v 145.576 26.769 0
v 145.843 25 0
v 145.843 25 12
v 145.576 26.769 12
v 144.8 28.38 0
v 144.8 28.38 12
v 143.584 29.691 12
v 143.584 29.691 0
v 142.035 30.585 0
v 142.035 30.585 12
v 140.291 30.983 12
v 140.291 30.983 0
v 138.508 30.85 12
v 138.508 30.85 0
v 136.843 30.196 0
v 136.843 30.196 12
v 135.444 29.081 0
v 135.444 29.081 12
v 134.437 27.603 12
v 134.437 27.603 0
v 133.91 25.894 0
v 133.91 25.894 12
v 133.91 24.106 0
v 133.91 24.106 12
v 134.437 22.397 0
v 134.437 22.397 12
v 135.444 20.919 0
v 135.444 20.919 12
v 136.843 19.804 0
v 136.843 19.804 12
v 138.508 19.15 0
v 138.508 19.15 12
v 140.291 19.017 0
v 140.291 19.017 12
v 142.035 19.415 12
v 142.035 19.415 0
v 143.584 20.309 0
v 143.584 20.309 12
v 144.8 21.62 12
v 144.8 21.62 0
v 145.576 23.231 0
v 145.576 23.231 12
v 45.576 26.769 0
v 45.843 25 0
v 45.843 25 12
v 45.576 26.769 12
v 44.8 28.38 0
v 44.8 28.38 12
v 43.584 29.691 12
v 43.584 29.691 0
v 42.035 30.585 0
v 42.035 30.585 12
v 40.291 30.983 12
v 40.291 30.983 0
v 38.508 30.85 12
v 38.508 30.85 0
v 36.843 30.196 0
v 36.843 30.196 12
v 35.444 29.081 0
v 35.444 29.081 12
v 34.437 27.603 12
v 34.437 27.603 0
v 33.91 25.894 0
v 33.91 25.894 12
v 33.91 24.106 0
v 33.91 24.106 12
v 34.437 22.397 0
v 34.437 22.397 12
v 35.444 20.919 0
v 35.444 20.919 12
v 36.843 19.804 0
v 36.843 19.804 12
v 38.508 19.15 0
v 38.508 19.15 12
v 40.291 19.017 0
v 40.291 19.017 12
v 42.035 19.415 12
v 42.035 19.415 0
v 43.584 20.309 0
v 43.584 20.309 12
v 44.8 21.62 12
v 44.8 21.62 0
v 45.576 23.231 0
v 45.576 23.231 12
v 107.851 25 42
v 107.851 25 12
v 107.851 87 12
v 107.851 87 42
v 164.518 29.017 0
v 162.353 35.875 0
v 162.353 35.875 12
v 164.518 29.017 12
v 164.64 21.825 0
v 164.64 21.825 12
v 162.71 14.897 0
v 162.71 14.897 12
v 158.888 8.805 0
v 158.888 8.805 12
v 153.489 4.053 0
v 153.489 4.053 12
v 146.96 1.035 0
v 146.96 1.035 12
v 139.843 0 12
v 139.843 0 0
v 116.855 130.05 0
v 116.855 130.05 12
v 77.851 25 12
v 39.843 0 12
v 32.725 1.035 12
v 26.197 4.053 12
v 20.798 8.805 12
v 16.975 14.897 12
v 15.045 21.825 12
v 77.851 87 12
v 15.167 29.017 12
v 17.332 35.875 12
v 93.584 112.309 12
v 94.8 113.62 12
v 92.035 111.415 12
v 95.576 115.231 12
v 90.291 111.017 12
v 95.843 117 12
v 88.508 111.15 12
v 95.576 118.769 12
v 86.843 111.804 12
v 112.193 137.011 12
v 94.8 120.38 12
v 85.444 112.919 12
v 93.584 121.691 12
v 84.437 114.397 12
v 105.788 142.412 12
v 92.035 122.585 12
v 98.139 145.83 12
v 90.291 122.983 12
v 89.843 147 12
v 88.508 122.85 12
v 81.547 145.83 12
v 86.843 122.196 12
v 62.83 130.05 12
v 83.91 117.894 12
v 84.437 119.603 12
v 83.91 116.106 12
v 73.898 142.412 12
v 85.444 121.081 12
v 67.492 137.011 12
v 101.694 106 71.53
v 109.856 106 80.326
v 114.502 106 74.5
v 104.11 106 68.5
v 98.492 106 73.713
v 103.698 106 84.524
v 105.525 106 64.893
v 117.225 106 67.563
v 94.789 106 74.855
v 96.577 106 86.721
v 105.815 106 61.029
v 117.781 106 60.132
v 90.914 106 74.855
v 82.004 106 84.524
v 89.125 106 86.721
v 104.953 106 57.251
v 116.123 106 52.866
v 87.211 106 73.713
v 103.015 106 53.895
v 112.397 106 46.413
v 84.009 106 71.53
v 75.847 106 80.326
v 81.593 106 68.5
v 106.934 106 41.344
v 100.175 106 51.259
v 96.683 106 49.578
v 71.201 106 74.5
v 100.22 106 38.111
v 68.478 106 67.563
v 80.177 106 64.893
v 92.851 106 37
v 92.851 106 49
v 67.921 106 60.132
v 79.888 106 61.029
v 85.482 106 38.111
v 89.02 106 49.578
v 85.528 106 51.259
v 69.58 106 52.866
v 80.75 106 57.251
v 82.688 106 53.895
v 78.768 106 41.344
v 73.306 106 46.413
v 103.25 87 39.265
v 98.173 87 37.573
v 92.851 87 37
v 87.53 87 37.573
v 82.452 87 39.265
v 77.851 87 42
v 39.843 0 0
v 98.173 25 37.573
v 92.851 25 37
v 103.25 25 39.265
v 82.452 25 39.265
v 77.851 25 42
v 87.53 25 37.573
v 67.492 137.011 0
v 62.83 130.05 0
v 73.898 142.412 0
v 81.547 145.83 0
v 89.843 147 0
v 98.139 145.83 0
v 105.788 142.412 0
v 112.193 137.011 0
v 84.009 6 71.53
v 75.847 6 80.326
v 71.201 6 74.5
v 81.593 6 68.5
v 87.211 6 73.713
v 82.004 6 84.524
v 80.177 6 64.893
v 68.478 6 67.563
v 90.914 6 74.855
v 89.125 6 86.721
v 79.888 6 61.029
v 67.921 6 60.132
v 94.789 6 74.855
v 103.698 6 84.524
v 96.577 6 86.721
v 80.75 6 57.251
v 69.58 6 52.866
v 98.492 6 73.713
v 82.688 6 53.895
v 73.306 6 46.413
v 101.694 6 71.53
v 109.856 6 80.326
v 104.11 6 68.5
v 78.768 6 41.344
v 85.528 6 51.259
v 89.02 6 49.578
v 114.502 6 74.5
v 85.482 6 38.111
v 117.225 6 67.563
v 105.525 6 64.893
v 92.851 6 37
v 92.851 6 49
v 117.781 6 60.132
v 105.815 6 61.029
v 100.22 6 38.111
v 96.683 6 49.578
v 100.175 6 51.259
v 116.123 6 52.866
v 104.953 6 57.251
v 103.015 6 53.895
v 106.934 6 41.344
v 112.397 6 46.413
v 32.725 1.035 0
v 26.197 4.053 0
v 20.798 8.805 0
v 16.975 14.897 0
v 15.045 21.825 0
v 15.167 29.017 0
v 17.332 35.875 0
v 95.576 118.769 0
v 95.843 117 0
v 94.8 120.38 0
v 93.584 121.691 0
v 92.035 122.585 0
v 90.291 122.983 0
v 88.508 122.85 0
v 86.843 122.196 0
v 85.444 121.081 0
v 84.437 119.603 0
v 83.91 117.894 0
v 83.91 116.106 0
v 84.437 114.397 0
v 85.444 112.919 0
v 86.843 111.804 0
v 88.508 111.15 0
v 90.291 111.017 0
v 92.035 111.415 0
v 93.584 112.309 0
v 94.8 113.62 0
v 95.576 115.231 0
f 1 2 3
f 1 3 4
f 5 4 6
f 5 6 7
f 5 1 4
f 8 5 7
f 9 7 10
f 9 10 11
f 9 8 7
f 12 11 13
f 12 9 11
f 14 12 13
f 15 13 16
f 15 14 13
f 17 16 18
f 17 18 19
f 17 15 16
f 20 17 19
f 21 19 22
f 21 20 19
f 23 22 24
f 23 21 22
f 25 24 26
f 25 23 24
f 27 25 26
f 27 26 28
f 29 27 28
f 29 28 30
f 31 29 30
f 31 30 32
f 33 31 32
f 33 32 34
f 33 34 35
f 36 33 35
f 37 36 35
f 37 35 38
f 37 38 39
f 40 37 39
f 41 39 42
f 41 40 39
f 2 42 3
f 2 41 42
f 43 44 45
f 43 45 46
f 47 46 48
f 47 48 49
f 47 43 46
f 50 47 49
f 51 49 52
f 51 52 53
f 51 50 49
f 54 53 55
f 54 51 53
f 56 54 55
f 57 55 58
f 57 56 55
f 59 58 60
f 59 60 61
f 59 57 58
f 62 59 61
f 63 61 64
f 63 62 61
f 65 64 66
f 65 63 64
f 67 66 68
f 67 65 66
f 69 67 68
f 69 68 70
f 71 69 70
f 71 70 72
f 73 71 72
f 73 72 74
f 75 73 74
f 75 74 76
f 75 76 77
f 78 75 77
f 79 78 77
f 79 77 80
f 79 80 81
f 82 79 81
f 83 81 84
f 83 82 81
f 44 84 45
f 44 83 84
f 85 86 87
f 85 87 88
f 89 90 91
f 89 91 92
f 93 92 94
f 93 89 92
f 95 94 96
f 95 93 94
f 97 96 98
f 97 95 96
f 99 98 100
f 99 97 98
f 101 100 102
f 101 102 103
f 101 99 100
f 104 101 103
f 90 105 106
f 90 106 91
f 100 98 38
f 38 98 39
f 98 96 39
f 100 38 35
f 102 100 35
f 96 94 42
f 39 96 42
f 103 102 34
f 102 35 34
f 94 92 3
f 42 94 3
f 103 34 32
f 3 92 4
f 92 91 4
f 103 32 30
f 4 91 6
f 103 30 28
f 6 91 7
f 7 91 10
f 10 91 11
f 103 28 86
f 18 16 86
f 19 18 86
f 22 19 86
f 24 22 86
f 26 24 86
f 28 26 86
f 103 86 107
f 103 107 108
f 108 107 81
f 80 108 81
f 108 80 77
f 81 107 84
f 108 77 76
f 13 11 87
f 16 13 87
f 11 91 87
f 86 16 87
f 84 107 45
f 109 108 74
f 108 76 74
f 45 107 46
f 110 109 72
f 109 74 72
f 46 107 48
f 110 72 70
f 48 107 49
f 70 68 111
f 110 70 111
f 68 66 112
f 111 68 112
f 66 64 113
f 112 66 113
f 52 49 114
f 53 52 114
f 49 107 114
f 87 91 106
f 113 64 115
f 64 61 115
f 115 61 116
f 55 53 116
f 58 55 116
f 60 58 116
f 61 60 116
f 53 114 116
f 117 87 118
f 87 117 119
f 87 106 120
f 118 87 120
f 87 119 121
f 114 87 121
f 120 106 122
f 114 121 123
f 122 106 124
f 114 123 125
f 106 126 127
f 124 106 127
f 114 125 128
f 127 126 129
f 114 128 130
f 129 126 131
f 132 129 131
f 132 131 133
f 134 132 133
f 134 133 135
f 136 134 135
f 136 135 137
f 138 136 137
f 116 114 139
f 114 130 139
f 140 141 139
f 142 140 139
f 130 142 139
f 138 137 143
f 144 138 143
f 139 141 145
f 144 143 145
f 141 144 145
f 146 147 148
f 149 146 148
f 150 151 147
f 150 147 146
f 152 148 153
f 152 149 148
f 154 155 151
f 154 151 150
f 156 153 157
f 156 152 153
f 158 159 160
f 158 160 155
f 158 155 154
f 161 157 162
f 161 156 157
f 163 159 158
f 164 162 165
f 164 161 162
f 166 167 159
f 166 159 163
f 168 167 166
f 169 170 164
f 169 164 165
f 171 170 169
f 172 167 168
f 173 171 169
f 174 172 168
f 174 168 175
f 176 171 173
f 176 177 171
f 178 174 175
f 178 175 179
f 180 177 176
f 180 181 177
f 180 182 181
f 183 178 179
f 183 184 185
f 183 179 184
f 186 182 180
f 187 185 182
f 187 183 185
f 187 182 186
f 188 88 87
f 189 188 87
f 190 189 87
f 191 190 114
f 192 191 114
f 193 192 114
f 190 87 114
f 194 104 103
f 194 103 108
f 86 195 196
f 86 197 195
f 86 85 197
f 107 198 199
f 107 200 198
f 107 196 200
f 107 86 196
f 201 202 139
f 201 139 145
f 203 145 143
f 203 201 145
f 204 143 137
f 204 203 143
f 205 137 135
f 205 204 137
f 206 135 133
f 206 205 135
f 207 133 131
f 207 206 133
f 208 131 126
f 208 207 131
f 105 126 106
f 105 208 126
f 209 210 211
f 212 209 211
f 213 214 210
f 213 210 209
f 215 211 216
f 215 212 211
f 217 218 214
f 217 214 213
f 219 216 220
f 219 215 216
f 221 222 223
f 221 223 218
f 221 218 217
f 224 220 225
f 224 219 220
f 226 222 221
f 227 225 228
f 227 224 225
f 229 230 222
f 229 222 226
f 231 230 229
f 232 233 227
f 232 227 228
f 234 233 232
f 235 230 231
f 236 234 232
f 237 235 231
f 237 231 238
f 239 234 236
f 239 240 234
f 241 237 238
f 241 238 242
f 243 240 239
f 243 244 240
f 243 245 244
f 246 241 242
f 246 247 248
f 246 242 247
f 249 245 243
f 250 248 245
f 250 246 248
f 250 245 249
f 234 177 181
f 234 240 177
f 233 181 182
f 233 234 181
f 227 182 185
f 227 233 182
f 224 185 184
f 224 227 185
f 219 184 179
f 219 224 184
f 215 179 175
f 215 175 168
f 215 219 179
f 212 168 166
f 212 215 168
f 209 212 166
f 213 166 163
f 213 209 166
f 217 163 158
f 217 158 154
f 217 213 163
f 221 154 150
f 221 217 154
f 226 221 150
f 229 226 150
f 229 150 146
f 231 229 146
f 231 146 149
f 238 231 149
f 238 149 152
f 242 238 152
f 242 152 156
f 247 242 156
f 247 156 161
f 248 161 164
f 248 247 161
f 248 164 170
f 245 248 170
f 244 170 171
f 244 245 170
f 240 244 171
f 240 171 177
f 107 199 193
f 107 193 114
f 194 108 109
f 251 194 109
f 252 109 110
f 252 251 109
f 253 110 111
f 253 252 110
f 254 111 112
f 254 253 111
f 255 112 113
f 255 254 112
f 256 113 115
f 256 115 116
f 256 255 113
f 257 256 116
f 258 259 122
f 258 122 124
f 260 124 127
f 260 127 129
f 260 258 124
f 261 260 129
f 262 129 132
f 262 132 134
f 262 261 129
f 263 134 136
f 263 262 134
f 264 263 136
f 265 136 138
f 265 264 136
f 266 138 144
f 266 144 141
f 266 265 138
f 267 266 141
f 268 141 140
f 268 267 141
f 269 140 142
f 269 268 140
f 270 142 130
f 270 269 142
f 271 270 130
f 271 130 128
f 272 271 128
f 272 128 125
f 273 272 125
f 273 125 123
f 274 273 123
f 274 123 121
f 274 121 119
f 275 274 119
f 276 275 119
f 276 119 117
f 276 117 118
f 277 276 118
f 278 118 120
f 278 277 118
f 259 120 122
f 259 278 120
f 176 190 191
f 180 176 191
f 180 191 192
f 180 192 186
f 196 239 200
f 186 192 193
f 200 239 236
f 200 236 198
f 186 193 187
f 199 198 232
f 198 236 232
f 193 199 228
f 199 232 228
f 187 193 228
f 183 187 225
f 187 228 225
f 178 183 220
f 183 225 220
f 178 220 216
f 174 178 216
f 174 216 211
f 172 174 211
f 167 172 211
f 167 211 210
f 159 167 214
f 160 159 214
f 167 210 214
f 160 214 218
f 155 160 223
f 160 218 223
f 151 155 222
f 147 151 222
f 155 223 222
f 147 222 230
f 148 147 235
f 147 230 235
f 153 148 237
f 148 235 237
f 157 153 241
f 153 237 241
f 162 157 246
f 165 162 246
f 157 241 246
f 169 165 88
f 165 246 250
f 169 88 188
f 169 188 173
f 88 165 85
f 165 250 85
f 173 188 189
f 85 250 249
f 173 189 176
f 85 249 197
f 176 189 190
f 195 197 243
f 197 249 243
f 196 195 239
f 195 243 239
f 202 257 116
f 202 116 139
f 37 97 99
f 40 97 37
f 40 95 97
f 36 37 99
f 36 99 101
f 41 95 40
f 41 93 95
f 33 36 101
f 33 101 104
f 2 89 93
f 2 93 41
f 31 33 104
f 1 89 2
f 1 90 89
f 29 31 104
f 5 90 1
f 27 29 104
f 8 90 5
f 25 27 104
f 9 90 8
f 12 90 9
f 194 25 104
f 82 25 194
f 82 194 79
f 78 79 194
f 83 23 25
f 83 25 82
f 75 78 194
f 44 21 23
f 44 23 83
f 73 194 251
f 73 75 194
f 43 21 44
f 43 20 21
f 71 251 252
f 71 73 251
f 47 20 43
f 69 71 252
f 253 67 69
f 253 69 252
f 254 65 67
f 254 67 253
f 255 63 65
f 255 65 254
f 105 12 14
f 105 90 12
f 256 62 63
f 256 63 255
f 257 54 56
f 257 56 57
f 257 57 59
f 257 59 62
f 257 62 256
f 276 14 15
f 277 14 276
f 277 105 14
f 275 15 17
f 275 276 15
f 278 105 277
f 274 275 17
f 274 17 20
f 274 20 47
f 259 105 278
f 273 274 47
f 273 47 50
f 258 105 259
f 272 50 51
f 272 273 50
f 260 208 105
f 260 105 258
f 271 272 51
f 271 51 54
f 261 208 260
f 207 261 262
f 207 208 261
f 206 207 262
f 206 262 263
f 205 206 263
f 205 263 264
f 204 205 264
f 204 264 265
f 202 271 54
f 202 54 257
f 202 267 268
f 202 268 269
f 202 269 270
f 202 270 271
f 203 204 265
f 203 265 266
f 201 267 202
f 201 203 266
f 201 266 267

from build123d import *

# Parameters (mm, degrees)
IZIM2_R                     = 6
Y_KSEKLIK_EKSTR_ZYON2_DEPTH = 12
IZIM4_R                     = 25
IZIM4_R_2                   = 13
Y_KSEKLIK_EKSTR_ZYON3_DEPTH = 62
IZIM4_6_R                   = 25
IZIM4_6_R_2                 = 13
Y_KSEKLIK_EKSTR_ZYON4_DEPTH = 19
IZIM5_R                     = 25
IZIM5_R_2                   = 13
Y_KSEKLIK_EKSTR_ZYON5_DEPTH = 19


with BuildPart() as part:
    # Çizim2 → Yükseklik-Ekstrüzyon2 (new body)
    with BuildSketch(Plane.XY):
        with BuildLine():
            Line((17.332096605, 35.875327714), (62.829976007, 130.050393256))
            ThreePointArc((62.829976007, 130.050393256), (89.842699599, 147), (116.85542319, 130.050393256))
            Line((116.85542319, 130.050393256), (162.353302592, 35.875327714))
            ThreePointArc((162.353302592, 35.875327714), (161.019139253, 11.712471879), (139.842699599, 0))
            Line((139.842699599, 0), (39.842699599, 0))
            ThreePointArc((39.842699599, 0), (18.666259945, 11.712471879), (17.332096605, 35.875327714))
        make_face()
        with Locations((89.842699599, 117)):
            Circle(IZIM2_R, mode=Mode.SUBTRACT)
        with Locations((39.842699599, 25)):
            Circle(IZIM2_R, mode=Mode.SUBTRACT)
        with Locations((139.842699599, 25)):
            Circle(IZIM2_R, mode=Mode.SUBTRACT)
    extrude(amount=Y_KSEKLIK_EKSTR_ZYON2_DEPTH)

    # Çizim4 → Yükseklik-Ekstrüzyon3 (add)
    with BuildSketch(Plane(origin=(0, 25, 0), x_dir=(-1, 0, 0), z_dir=(0, -1, 0))):
        with BuildLine():
            ThreePointArc((-107.851357607, -42), (-92.851357607, -37), (-77.851357607, -42))
            Line((-77.851357607, -42), (-77.851357607, -12))
            Line((-77.851357607, -12), (-107.851357607, -12))
            Line((-107.851357607, -12), (-107.851357607, -42))
        make_face()
        with Locations((-92.851357607, -62)):
            Circle(IZIM4_R)
        with Locations(Location((-92.851357607, -62, 0), (0, 0, 90))):
            Circle(IZIM4_R_2, mode=Mode.SUBTRACT)
    extrude(amount=-Y_KSEKLIK_EKSTR_ZYON3_DEPTH)

    # Çizim4<6> → Yükseklik-Ekstrüzyon4 (add)
    with BuildSketch(Plane(origin=(0, 25, 0), x_dir=(-1, 0, 0), z_dir=(0, -1, 0))):
        with Locations(Location((-92.851357607, -62, 0), (0, 0, 90))):
            Circle(IZIM4_6_R)
        with Locations(Location((-92.851357607, -62, 0), (0, 0, 90))):
            Circle(IZIM4_6_R_2, mode=Mode.SUBTRACT)
    extrude(amount=Y_KSEKLIK_EKSTR_ZYON4_DEPTH)

    # Çizim5 → Yükseklik-Ekstrüzyon5 (add)
    with BuildSketch(Plane(origin=(0, 87, 0), x_dir=(1, 0, 0), z_dir=(0, 1, 0))):
        with Locations(Location((92.851357607, -62, 0), (0, 0, 90))):
            Circle(IZIM5_R)
        with Locations(Location((92.851357607, -62, 0), (0, 0, 90))):
            Circle(IZIM5_R_2, mode=Mode.SUBTRACT)
    extrude(amount=Y_KSEKLIK_EKSTR_ZYON5_DEPTH)


solid = part.part
